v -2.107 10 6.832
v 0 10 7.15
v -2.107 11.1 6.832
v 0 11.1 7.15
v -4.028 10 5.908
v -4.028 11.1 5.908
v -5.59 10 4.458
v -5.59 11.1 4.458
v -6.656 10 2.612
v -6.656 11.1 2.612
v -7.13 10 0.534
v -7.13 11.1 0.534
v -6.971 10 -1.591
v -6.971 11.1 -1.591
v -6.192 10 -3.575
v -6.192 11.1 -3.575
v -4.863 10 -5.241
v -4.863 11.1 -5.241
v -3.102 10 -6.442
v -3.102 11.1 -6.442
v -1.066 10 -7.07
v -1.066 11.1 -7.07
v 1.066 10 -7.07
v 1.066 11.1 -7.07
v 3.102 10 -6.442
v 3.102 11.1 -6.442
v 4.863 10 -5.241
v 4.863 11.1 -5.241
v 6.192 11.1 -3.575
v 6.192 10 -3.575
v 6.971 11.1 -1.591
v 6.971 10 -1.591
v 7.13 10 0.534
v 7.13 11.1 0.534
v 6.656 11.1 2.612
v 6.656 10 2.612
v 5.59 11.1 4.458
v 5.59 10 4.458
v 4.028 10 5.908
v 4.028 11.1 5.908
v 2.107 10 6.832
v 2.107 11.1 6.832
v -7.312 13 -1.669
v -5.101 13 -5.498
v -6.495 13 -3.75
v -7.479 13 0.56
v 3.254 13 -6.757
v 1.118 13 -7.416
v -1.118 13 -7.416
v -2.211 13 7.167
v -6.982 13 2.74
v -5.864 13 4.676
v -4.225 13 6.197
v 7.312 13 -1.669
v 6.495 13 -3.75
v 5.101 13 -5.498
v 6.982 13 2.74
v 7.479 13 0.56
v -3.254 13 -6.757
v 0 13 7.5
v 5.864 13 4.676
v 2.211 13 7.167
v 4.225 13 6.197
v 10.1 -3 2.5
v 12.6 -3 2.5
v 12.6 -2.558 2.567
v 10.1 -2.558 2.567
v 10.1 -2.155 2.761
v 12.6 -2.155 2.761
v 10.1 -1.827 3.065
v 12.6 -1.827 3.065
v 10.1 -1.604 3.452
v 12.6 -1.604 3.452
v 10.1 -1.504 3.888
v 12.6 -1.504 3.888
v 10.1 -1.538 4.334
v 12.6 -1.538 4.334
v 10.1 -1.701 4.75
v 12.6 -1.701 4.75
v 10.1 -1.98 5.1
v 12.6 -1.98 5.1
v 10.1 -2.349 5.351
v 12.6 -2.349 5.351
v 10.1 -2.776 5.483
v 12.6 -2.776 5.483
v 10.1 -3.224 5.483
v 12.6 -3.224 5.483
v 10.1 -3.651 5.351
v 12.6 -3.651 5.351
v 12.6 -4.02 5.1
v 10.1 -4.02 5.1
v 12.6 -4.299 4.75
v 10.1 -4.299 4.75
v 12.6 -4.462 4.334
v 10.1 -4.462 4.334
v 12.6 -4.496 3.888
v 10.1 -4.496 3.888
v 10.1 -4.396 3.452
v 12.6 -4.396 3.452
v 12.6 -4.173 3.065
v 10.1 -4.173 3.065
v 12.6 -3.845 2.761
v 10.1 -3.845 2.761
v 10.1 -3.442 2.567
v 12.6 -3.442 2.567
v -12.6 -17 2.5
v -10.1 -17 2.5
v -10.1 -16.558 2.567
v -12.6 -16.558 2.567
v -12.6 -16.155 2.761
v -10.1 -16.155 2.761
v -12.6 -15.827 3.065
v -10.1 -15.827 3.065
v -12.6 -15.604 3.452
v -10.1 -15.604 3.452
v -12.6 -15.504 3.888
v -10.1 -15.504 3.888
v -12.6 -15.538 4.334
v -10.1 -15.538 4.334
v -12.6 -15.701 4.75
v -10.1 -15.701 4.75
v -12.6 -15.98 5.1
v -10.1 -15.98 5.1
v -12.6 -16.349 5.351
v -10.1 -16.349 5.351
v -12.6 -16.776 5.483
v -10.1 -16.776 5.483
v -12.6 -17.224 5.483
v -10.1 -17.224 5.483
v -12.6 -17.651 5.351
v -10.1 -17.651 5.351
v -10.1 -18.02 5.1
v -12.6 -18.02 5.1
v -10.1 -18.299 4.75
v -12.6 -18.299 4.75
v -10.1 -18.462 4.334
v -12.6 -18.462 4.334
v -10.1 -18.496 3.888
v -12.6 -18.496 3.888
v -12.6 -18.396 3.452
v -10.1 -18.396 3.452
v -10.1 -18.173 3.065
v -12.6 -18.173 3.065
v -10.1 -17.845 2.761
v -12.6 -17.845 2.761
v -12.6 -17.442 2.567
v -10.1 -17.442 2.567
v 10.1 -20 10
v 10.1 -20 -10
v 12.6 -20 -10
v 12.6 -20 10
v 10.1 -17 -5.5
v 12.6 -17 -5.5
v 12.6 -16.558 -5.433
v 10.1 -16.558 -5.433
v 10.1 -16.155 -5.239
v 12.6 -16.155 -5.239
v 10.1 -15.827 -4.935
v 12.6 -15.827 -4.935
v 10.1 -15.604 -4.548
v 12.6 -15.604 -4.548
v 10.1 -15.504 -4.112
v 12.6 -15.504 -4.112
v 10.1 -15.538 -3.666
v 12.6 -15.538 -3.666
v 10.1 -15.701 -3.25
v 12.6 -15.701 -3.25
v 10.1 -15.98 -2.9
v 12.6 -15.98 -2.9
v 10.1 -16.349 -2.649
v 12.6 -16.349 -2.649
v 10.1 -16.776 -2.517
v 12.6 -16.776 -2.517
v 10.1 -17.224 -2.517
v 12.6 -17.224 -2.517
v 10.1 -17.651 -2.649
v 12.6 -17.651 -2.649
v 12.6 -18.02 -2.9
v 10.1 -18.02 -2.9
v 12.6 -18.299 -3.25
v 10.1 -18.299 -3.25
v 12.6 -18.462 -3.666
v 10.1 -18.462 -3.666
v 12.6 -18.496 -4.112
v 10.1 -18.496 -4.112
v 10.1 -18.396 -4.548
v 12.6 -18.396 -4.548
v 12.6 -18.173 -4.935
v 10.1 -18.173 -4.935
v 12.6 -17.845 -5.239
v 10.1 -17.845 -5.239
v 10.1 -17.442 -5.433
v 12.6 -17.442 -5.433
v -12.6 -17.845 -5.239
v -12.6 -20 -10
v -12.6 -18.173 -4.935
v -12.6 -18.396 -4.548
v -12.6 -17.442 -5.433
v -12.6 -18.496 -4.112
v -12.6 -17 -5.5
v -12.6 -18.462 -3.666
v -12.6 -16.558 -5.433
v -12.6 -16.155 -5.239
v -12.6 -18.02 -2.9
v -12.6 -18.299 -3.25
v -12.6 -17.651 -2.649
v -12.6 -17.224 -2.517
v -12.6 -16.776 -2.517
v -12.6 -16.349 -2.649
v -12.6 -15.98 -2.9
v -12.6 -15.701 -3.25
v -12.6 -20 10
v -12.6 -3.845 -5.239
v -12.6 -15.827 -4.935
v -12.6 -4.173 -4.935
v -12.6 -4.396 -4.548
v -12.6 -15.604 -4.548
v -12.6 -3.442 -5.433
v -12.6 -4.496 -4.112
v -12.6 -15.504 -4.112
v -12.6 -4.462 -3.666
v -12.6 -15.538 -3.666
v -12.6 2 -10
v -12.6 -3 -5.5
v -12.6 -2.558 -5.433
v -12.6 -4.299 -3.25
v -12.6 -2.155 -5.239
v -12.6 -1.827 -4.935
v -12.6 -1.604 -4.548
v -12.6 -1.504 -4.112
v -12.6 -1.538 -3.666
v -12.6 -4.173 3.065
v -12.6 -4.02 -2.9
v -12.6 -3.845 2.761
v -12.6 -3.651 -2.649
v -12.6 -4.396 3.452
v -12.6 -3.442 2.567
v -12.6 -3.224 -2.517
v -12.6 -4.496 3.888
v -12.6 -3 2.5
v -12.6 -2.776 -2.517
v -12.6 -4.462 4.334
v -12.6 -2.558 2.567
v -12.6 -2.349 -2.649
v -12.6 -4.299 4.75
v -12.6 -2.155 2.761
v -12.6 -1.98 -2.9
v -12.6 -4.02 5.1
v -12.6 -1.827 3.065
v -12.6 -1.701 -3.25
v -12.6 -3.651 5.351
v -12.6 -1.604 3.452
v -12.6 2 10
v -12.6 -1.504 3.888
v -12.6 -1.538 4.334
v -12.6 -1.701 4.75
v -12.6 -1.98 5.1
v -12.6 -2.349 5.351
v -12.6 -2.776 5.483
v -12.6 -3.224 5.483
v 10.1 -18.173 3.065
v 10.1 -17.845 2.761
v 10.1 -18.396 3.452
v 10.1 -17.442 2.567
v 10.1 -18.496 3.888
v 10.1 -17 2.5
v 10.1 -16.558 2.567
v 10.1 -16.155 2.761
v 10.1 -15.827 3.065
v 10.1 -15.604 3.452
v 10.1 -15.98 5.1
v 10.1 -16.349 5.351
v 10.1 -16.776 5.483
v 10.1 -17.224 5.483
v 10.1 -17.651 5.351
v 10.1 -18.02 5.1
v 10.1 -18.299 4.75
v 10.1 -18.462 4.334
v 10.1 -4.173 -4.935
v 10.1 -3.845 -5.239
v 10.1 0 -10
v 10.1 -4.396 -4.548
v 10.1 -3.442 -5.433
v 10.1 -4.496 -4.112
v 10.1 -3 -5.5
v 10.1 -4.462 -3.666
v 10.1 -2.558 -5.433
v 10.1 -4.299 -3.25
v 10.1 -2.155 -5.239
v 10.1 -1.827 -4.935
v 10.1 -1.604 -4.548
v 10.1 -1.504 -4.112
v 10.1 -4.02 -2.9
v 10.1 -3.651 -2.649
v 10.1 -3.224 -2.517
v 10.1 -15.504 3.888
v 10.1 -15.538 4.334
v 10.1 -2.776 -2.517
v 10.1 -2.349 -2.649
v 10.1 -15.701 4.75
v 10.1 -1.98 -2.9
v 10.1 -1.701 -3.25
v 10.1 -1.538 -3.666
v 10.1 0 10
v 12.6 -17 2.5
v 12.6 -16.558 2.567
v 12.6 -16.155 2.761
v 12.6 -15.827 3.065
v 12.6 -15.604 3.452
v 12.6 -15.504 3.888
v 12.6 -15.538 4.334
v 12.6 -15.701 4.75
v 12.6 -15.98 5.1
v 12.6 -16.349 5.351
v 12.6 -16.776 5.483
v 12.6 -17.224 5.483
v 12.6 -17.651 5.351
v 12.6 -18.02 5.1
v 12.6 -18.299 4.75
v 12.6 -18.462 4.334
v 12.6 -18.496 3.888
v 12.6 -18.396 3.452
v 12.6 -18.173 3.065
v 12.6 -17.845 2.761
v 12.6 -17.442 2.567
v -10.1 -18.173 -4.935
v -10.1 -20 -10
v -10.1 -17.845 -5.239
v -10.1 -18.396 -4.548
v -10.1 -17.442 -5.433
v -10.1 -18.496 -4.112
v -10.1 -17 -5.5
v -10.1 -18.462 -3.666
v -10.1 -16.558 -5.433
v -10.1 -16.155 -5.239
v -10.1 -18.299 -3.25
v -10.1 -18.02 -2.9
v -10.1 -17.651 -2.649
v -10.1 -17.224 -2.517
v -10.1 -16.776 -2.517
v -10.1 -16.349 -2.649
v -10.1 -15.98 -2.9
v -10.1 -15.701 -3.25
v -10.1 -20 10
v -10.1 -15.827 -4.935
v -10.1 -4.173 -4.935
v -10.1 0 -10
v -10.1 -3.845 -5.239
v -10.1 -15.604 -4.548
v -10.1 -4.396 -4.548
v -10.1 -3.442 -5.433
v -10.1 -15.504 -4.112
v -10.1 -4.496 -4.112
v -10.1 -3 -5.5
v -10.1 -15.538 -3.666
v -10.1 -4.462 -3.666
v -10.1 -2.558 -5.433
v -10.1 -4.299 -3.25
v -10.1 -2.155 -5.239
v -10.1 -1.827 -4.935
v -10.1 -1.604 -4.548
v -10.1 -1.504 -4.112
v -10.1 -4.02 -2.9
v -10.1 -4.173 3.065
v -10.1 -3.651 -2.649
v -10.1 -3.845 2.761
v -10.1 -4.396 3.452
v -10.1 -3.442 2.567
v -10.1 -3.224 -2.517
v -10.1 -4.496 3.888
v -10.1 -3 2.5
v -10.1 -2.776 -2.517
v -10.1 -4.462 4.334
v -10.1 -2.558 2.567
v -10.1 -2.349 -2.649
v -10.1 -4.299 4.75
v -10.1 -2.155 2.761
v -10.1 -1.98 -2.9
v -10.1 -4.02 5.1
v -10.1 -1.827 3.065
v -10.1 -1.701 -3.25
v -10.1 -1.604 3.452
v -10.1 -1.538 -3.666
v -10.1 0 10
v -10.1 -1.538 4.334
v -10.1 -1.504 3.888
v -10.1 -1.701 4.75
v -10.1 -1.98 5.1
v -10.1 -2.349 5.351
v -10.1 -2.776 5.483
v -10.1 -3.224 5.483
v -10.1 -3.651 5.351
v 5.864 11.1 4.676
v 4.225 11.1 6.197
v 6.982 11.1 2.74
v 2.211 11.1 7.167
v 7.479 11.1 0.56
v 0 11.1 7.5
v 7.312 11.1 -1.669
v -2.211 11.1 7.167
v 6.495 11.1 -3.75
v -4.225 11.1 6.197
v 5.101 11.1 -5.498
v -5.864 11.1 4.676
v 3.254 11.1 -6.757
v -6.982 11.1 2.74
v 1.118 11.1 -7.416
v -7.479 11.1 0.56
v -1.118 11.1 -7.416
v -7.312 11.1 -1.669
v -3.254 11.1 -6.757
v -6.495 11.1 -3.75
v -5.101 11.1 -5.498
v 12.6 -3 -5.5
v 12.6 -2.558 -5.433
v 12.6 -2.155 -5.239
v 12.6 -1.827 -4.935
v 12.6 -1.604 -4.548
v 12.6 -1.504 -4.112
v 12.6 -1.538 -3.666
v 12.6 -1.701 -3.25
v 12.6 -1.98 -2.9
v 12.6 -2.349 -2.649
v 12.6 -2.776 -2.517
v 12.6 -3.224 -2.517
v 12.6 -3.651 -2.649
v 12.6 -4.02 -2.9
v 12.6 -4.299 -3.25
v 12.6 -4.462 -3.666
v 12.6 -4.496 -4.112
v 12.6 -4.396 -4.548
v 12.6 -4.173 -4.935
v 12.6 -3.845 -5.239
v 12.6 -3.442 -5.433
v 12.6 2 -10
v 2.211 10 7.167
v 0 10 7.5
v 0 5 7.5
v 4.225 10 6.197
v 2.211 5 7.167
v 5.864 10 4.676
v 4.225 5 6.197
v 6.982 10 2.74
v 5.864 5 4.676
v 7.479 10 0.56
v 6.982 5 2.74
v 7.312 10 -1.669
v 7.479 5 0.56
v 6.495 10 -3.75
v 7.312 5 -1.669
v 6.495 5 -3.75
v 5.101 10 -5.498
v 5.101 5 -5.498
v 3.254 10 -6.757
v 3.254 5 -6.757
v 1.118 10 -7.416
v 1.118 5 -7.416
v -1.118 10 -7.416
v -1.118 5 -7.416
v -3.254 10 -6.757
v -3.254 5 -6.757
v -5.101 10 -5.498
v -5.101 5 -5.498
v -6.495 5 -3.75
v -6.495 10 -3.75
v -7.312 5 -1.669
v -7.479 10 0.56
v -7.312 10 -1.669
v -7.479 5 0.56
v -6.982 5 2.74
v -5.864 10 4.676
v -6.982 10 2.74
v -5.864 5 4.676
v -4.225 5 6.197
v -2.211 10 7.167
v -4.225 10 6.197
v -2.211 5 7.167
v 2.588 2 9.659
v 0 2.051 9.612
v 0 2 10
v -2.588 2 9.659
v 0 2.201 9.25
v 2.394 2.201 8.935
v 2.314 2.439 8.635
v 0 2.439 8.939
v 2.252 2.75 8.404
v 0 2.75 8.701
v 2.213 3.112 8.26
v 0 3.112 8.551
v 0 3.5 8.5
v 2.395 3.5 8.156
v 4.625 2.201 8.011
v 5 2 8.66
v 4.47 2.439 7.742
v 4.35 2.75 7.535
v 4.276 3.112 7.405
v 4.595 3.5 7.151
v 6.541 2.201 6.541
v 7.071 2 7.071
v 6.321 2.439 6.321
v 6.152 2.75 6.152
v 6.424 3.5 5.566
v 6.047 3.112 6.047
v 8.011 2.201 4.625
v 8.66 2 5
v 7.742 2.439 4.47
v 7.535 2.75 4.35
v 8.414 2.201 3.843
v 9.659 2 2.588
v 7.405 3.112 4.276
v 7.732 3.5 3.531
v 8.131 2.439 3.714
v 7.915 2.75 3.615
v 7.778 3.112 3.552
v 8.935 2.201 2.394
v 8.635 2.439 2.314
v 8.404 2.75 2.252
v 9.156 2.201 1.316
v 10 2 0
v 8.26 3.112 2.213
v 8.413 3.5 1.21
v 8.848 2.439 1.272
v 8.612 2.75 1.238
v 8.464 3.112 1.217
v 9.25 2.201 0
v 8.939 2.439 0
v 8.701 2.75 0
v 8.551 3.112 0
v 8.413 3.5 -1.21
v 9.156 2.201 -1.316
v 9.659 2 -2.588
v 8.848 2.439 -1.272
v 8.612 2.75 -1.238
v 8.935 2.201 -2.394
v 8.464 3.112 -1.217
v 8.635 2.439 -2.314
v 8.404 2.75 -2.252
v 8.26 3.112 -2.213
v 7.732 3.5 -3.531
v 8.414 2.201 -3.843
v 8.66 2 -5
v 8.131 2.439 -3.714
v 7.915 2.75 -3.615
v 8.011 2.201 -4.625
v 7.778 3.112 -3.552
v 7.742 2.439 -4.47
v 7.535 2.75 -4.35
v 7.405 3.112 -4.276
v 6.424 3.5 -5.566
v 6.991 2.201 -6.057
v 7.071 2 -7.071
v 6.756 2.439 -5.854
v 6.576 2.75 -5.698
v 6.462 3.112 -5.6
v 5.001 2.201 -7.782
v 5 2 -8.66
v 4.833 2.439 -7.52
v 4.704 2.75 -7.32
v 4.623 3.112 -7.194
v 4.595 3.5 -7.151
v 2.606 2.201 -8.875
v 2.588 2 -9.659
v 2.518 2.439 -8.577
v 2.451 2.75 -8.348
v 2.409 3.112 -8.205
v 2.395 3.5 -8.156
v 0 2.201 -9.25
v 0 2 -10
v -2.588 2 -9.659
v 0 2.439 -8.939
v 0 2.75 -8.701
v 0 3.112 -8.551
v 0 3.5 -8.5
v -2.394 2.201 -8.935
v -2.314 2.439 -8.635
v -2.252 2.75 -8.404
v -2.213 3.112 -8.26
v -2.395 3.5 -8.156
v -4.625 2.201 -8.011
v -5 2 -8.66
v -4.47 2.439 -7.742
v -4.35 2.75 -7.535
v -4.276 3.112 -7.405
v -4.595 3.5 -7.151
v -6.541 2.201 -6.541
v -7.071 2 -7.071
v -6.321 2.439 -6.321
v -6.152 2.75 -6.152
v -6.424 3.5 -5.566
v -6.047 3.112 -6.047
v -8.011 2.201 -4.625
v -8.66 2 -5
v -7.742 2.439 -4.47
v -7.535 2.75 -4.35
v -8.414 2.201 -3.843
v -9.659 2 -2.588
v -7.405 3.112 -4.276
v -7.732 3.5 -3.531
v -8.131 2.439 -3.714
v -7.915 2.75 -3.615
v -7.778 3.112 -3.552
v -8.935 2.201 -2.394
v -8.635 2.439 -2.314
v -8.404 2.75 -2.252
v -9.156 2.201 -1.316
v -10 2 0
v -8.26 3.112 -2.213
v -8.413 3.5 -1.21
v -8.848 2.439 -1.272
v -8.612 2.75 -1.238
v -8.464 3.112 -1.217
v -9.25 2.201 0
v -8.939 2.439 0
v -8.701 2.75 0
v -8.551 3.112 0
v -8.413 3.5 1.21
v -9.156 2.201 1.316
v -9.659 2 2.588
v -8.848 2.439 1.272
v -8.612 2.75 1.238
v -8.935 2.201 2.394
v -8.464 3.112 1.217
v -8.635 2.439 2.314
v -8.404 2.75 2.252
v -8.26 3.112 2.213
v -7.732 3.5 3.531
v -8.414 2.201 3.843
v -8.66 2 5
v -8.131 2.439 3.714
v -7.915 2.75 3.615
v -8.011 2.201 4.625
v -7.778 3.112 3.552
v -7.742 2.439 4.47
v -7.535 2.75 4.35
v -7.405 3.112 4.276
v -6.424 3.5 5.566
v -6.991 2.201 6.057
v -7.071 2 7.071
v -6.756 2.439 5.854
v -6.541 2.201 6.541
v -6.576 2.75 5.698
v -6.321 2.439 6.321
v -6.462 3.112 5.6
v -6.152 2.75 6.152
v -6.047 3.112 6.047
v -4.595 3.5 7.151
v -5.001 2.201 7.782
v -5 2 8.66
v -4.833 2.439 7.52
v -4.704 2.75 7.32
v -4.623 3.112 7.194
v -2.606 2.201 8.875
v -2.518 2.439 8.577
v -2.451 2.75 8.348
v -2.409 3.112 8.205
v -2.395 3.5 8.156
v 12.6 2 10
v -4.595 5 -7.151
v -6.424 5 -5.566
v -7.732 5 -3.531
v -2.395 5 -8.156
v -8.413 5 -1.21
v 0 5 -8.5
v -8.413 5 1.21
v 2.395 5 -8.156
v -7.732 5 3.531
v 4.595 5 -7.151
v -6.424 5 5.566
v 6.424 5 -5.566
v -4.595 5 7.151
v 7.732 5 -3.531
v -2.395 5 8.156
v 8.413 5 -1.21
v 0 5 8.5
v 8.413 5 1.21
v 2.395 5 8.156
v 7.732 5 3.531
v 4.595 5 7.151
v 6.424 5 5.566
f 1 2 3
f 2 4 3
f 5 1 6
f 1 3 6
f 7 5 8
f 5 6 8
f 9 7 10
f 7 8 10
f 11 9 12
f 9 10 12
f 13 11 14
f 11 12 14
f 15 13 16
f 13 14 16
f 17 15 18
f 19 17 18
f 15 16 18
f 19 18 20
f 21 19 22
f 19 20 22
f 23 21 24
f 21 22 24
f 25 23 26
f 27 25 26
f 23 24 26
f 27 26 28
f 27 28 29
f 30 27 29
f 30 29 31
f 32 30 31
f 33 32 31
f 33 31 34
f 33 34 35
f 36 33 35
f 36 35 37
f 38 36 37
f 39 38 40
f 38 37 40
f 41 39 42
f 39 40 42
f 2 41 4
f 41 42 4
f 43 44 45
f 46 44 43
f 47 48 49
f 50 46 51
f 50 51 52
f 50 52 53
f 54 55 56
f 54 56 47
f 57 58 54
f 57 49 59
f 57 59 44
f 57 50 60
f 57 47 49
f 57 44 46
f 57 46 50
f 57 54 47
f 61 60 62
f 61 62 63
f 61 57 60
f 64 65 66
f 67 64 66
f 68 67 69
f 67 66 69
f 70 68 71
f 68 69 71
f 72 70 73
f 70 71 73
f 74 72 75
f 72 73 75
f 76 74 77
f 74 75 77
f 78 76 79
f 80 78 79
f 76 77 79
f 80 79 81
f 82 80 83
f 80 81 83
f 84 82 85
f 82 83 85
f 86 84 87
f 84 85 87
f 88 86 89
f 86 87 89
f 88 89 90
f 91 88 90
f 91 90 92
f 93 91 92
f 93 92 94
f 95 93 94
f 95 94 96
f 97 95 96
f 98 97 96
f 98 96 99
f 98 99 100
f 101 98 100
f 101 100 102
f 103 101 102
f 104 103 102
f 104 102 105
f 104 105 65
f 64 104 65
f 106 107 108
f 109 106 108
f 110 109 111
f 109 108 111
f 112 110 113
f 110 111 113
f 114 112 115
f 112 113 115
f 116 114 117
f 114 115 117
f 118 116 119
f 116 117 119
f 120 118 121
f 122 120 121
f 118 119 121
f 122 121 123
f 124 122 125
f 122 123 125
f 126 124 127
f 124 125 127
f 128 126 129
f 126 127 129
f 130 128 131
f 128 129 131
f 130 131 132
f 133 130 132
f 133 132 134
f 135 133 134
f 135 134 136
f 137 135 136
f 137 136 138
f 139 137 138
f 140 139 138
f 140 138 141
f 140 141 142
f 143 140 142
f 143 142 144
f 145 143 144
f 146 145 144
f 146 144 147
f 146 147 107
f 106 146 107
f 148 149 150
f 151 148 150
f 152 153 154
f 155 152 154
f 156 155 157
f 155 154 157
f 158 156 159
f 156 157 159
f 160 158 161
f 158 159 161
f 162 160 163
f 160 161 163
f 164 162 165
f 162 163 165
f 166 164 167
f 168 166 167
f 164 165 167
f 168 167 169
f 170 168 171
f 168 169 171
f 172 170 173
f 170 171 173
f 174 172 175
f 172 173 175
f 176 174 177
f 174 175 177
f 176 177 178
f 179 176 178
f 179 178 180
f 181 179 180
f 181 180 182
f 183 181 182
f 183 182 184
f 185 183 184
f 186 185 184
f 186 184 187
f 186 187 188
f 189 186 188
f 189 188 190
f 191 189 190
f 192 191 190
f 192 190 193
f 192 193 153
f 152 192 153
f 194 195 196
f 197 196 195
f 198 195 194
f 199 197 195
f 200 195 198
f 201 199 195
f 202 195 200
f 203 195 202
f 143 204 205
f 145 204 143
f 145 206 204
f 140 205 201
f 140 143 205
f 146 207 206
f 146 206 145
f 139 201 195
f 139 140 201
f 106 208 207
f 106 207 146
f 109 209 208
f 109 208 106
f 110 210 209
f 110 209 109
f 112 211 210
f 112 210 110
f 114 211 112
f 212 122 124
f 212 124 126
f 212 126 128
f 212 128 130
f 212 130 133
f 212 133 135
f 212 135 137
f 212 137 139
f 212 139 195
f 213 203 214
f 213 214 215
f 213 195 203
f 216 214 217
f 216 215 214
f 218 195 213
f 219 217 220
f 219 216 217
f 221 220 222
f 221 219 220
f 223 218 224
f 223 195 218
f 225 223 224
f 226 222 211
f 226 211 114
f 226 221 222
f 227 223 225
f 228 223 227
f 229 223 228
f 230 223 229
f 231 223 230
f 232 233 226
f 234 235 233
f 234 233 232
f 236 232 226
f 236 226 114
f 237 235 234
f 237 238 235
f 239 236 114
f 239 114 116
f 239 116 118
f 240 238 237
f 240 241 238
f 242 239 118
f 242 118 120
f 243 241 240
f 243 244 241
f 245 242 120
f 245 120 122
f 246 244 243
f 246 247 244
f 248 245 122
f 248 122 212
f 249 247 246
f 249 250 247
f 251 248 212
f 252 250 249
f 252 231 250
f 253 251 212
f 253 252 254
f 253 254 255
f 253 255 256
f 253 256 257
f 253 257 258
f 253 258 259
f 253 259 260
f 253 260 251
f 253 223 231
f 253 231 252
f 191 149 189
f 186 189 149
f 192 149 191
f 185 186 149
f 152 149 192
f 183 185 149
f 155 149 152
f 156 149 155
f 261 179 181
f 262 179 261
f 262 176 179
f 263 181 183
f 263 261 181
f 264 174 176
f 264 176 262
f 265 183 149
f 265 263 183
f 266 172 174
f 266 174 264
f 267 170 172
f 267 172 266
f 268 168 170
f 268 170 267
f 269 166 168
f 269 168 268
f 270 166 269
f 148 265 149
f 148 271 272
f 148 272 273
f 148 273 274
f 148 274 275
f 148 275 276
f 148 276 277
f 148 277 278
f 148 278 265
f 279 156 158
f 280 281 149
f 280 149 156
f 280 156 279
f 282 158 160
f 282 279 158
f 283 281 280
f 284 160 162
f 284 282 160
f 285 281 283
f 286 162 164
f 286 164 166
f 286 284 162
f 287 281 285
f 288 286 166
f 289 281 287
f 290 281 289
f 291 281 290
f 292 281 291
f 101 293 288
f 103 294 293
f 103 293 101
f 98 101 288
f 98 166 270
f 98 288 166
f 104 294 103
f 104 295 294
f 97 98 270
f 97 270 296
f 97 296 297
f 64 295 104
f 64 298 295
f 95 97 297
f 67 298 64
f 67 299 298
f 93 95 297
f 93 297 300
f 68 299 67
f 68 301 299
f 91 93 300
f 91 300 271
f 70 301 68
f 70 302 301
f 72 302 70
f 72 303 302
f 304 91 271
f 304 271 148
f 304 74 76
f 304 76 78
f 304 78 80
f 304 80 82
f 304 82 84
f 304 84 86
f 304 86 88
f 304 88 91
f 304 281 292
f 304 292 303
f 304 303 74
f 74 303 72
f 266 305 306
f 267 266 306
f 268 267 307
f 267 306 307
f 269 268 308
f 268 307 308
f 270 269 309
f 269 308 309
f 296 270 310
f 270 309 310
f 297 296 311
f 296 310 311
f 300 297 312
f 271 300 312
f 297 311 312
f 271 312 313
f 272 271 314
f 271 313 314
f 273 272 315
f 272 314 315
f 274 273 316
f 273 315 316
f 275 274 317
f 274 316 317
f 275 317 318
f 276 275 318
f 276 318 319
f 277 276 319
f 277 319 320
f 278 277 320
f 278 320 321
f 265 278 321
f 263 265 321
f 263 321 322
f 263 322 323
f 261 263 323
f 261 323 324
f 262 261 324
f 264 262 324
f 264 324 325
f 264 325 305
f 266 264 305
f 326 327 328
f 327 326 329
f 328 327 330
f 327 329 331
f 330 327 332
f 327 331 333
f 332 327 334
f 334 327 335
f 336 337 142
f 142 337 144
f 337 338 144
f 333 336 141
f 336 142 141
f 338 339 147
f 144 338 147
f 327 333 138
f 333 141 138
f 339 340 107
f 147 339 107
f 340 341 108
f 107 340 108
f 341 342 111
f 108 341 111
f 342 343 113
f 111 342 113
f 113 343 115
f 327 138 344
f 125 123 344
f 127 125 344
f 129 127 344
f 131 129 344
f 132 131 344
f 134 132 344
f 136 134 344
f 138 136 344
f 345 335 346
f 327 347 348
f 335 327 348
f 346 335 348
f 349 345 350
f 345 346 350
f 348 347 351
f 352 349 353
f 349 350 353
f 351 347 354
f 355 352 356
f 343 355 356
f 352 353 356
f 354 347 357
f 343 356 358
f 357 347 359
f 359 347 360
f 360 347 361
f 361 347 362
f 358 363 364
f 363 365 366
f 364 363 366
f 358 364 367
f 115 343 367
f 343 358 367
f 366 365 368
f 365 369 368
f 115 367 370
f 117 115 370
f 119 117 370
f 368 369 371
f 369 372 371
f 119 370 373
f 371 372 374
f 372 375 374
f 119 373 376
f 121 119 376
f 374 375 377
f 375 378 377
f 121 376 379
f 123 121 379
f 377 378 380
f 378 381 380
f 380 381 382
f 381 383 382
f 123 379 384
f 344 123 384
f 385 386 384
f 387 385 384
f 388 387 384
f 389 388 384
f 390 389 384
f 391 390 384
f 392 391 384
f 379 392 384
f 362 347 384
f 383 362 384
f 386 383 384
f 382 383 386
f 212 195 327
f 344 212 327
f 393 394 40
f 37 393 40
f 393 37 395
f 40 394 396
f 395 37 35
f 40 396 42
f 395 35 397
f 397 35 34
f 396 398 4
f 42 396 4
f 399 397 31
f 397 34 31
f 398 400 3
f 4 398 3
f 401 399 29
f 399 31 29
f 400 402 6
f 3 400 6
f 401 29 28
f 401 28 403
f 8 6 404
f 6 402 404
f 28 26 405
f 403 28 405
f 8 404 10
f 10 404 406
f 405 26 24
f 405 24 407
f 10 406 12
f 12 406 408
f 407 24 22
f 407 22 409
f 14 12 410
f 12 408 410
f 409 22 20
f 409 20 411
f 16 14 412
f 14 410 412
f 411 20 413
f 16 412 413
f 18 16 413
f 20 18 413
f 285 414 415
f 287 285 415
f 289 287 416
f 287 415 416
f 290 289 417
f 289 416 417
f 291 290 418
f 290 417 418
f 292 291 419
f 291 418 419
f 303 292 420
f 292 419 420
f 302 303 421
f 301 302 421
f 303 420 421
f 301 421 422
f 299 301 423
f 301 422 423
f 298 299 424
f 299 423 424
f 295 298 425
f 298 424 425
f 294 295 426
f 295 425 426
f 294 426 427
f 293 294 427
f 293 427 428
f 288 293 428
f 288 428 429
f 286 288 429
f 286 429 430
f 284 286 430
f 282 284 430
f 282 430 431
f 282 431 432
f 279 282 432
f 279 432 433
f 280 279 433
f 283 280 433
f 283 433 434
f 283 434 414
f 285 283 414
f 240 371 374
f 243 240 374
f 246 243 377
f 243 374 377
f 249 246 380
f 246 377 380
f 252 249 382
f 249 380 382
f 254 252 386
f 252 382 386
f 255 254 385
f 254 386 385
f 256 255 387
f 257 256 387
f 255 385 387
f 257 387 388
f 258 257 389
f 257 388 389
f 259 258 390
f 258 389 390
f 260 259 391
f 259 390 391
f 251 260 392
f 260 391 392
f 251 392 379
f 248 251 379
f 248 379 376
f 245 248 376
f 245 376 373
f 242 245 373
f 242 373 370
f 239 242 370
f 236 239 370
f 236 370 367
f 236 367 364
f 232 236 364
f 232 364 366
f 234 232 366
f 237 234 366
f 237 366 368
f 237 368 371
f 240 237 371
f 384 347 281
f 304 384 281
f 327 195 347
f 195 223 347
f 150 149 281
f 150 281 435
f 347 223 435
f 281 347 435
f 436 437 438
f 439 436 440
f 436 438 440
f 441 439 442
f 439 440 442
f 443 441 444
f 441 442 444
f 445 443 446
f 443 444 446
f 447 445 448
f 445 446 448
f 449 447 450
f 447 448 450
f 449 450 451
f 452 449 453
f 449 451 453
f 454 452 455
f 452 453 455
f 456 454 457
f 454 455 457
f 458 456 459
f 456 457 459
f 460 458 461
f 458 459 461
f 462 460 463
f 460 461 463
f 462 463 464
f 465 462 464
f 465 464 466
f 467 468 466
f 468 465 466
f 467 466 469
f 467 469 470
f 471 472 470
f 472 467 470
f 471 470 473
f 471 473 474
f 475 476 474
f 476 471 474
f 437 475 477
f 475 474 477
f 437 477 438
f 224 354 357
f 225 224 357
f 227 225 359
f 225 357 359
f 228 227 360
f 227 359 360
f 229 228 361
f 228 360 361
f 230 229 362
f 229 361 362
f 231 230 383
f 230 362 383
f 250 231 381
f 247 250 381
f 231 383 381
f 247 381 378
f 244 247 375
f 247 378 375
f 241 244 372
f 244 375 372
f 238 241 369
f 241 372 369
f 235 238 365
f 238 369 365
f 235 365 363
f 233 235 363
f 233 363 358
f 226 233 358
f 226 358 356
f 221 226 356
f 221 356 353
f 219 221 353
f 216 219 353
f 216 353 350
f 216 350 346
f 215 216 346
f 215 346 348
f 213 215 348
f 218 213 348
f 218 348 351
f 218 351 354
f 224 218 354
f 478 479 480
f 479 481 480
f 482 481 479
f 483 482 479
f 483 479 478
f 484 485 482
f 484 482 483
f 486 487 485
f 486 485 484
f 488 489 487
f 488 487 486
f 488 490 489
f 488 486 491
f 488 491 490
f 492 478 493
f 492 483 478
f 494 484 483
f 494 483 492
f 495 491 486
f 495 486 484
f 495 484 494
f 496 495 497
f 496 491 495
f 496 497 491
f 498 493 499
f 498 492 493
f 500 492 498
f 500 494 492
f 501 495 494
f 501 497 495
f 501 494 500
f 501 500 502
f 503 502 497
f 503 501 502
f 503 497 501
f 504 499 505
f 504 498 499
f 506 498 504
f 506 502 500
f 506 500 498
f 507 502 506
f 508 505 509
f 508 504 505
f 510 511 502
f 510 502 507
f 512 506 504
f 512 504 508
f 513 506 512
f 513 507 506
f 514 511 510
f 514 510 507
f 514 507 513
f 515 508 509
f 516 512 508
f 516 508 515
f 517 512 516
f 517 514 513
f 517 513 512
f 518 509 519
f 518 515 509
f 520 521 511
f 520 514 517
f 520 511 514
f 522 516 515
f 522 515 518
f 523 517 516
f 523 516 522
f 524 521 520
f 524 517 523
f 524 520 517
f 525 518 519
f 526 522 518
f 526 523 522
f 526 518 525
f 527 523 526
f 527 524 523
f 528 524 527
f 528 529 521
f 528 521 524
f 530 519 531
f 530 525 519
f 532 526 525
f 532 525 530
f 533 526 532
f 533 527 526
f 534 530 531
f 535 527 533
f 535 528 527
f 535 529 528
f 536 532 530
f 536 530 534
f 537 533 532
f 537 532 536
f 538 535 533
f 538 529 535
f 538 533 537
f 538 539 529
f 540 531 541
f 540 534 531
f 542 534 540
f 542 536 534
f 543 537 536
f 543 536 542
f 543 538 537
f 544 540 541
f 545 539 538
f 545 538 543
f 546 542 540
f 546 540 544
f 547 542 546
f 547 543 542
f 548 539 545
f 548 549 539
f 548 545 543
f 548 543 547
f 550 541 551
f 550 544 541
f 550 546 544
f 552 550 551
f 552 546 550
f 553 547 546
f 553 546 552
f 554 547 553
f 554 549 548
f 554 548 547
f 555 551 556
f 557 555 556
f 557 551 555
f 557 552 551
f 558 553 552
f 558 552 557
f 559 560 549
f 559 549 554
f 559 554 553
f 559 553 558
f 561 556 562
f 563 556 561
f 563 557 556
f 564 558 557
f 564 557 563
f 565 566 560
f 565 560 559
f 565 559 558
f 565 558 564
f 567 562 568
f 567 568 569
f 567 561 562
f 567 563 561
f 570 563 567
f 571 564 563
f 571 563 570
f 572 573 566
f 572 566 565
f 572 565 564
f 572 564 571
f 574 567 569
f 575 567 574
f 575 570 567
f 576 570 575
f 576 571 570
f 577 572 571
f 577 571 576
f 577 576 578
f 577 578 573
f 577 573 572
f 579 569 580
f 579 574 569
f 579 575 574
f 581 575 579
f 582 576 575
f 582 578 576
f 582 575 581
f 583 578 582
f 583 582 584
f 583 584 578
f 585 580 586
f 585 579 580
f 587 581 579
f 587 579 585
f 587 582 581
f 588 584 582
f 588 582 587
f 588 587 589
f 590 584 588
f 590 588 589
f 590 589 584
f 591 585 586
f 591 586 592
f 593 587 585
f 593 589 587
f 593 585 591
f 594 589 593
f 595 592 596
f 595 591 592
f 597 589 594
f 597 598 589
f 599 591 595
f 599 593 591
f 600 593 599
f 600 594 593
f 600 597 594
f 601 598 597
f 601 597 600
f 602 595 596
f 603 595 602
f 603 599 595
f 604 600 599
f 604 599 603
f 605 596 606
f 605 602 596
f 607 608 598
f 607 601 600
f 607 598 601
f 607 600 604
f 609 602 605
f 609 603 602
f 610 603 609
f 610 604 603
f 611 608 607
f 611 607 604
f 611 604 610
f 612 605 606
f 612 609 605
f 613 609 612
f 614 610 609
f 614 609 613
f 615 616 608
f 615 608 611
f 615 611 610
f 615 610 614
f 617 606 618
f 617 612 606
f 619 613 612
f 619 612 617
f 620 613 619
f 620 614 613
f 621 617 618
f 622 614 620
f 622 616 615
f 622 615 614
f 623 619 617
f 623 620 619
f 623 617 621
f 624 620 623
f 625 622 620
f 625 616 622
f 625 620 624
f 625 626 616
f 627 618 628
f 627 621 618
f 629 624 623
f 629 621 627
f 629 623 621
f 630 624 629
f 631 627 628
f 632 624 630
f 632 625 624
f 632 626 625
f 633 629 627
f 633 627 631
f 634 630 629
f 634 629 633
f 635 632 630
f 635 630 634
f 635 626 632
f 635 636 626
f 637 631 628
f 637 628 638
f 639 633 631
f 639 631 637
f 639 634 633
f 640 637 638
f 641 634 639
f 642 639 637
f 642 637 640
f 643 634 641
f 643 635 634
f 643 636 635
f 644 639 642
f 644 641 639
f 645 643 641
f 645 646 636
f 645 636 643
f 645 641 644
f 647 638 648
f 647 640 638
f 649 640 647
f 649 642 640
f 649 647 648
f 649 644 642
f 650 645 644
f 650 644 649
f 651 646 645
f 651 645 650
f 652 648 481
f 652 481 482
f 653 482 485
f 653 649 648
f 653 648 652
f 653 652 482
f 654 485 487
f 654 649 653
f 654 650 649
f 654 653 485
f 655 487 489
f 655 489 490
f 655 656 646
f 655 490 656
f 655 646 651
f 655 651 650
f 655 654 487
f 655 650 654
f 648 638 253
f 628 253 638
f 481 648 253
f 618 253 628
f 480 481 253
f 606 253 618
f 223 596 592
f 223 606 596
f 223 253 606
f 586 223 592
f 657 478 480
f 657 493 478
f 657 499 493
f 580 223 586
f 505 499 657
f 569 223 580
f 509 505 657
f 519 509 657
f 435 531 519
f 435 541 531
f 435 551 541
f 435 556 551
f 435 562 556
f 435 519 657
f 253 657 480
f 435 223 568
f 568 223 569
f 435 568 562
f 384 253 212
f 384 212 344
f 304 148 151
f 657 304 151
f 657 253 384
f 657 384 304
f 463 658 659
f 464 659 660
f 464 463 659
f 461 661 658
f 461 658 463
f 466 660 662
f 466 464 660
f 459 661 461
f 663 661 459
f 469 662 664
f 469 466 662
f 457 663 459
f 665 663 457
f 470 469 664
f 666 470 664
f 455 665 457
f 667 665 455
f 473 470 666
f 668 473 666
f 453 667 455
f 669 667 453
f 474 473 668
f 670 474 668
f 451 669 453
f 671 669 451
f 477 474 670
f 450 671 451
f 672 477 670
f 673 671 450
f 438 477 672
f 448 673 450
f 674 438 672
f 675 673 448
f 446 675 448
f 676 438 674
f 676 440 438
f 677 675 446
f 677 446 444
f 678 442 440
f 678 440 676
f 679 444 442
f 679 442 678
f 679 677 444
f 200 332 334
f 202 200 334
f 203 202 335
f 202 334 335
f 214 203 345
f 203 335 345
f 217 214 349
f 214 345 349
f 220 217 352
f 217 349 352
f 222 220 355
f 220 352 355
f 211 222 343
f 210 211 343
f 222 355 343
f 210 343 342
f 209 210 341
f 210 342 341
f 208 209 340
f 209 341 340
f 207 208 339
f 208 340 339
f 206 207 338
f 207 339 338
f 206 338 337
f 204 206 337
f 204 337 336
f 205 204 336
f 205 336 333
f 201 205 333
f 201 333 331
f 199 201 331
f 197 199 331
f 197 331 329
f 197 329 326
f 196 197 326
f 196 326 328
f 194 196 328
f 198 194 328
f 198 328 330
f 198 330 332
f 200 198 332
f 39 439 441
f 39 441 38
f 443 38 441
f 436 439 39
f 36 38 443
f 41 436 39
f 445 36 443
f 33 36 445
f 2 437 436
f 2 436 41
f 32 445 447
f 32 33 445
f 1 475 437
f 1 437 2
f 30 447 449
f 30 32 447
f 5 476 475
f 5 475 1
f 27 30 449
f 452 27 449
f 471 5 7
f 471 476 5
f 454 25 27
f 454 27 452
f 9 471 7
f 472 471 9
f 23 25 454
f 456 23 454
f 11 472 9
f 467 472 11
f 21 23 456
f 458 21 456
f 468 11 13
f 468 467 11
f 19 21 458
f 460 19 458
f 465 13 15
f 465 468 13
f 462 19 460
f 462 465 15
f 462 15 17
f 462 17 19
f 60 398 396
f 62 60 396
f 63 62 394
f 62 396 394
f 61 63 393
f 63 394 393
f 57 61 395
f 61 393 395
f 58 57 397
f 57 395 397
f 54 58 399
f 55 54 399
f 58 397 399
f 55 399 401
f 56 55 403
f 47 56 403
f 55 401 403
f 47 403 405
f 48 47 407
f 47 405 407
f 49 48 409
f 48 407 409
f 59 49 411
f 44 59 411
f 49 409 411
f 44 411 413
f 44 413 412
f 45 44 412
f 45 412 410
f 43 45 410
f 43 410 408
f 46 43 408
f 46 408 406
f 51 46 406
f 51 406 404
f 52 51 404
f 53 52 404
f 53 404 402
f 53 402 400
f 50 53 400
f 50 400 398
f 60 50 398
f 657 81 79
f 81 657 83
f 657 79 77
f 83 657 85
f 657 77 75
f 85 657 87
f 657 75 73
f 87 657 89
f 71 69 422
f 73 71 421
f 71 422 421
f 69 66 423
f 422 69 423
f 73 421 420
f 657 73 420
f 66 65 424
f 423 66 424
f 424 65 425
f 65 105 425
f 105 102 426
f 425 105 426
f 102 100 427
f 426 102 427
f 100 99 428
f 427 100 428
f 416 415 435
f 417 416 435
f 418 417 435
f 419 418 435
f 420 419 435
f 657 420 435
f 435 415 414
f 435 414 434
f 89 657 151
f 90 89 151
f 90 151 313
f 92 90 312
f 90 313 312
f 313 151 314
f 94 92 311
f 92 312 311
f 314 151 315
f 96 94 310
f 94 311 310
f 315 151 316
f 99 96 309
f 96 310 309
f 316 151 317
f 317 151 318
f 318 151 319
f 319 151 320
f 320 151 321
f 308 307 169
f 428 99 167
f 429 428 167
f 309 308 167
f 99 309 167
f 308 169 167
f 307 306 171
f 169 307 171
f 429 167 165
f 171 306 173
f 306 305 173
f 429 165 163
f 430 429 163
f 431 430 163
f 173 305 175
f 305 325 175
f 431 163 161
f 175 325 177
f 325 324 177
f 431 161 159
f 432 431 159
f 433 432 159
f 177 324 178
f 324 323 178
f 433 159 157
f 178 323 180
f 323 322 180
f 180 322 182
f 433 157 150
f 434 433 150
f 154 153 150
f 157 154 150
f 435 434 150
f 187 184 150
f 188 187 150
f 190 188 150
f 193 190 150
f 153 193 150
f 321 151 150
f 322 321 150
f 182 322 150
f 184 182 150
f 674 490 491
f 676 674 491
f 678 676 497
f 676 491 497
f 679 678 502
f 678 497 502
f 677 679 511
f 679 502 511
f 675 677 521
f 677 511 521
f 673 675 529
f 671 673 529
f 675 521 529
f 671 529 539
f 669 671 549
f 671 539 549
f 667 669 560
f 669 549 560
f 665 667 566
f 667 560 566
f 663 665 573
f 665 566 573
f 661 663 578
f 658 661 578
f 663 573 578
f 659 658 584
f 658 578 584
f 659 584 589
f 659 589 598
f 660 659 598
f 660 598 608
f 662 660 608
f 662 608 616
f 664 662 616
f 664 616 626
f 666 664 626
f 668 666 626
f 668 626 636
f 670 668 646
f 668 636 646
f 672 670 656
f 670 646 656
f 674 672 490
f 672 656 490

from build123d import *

# Parameters (mm, degrees)
SKETCH_1_W          = 25.2
SKETCH_1_H          = 20
EXTRUDE_1_DEPTH     = 2
SKETCH_2_W          = 2.5
SKETCH_2_H          = 20
EXTRUDE_2_DEPTH     = 20
SKETCH_3_R          = 1.5
CUT_EXTRUDE_1_DEPTH = 34.690354703
SKETCH_4_R          = 8.5
EXTRUDE_3_DEPTH     = 3
SKETCH_5_R          = 7.5
EXTRUDE_4_DEPTH     = 8
SKETCH_6_R          = 7
EXTRUDE_5_DEPTH     = 18
SKETCH_10_R         = 9.319748931
SKETCH_10_W         = 12
SKETCH_10_H         = 12
CUT_EXTRUDE_4_DEPTH = 15
FILLET_2_R          = 1.5
SKETCH_12_R         = 7.5
CUT_EXTRUDE_5_DEPTH = 26
SKETCH_13_W         = 0.35
SKETCH_13_H         = 1.1


with BuildPart() as part:
    # 草图1 → 凸台-拉伸1 (new body)
    with BuildSketch(Plane(origin=(0, 0, 0), x_dir=(1, 0, 0), z_dir=(0, 1, 0))):
        Rectangle(SKETCH_1_W, SKETCH_1_H)
    extrude(amount=EXTRUDE_1_DEPTH)

    # 草图2 → 凸台-拉伸2 (add)
    with BuildSketch(Plane.XZ):
        with Locations((-11.35, 0)):
            Rectangle(SKETCH_2_W, SKETCH_2_H)
        with Locations((11.35, 0)):
            Rectangle(SKETCH_2_W, SKETCH_2_H)
    extrude(amount=EXTRUDE_2_DEPTH)

    # 草图3 → 切除-拉伸1 (cut, through all)
    with BuildSketch(Plane(origin=(12.6, 0, 0), x_dir=(0, 0, -1), z_dir=(1, 0, 0))):
        with Locations((-4, -17)):
            Circle(SKETCH_3_R)
        with Locations((4, -17)):
            Circle(SKETCH_3_R)
        with Locations((4, -3)):
            Circle(SKETCH_3_R)
        with Locations((-4, -3)):
            Circle(SKETCH_3_R)
    extrude(amount=-CUT_EXTRUDE_1_DEPTH, mode=Mode.SUBTRACT)

    # 草图4 → 凸台-拉伸3 (add)
    with BuildSketch(Plane(origin=(0, 2, 0), x_dir=(1, 0, 0), z_dir=(0, 1, 0))):
        with Locations(Location((0, 0, 0), (0, 0, 270))):
            Circle(SKETCH_4_R)
    extrude(amount=EXTRUDE_3_DEPTH)

    # 草图5 → 凸台-拉伸4 (add)
    with BuildSketch(Plane(origin=(0, 5, 0), x_dir=(1, 0, 0), z_dir=(0, 1, 0))):
        with Locations(Location((0, 0, 0), (0, 0, 270))):
            Circle(SKETCH_5_R)
    extrude(amount=EXTRUDE_4_DEPTH)

    # 草图6 → 凸台-拉伸5 (add)
    with BuildSketch(Plane(origin=(0, 13, 0), x_dir=(1, 0, 0), z_dir=(0, 1, 0))):
        with Locations(Location((0, 0, 0), (0, 0, 270))):
            Circle(SKETCH_6_R)
    extrude(amount=EXTRUDE_5_DEPTH)

    # 草图10 → 切除-拉伸4 (cut)
    with BuildSketch(Plane(origin=(0, 31, 0), x_dir=(1, 0, 0), z_dir=(0, 1, 0))):
        Circle(SKETCH_10_R)
        Rectangle(SKETCH_10_W, SKETCH_10_H, mode=Mode.SUBTRACT)
    extrude(amount=-CUT_EXTRUDE_4_DEPTH, mode=Mode.SUBTRACT)

    # 圆角2
    fillet_2_edges = [part.edges().sort_by_distance(p)[0] for p in [
        (0, 2, -8.5),
    ]]
    fillet(fillet_2_edges, radius=FILLET_2_R - 0.0001)  # a hair under: the kernel refuses the full size

    # 草图12 → 切除-拉伸5 (cut)
    with BuildSketch(Plane(origin=(0, 13, 0), x_dir=(1, 0, 0), z_dir=(0, 1, 0))):
        with Locations(Location((0, 0, 0), (0, 0, 270))):
            Circle(SKETCH_12_R)
    extrude(amount=CUT_EXTRUDE_5_DEPTH, mode=Mode.SUBTRACT)

    # 草图13 → 切除-旋转1 (revolve, cut)
    with BuildSketch(Plane(origin=(0, 0, 0), x_dir=(0, 0, -1), z_dir=(1, 0, 0)), mode=Mode.PRIVATE) as cut_revolve_1_sk:
        with Locations((7.325, 10.55)):
            Rectangle(SKETCH_13_W, SKETCH_13_H)
    revolve(cut_revolve_1_sk.sketch.rotate(Axis((0, 13, 0), (0, -1, 0)), 180), axis=Axis((0, 13, 0), (0, -1, 0)), mode=Mode.SUBTRACT)


solid = part.part
